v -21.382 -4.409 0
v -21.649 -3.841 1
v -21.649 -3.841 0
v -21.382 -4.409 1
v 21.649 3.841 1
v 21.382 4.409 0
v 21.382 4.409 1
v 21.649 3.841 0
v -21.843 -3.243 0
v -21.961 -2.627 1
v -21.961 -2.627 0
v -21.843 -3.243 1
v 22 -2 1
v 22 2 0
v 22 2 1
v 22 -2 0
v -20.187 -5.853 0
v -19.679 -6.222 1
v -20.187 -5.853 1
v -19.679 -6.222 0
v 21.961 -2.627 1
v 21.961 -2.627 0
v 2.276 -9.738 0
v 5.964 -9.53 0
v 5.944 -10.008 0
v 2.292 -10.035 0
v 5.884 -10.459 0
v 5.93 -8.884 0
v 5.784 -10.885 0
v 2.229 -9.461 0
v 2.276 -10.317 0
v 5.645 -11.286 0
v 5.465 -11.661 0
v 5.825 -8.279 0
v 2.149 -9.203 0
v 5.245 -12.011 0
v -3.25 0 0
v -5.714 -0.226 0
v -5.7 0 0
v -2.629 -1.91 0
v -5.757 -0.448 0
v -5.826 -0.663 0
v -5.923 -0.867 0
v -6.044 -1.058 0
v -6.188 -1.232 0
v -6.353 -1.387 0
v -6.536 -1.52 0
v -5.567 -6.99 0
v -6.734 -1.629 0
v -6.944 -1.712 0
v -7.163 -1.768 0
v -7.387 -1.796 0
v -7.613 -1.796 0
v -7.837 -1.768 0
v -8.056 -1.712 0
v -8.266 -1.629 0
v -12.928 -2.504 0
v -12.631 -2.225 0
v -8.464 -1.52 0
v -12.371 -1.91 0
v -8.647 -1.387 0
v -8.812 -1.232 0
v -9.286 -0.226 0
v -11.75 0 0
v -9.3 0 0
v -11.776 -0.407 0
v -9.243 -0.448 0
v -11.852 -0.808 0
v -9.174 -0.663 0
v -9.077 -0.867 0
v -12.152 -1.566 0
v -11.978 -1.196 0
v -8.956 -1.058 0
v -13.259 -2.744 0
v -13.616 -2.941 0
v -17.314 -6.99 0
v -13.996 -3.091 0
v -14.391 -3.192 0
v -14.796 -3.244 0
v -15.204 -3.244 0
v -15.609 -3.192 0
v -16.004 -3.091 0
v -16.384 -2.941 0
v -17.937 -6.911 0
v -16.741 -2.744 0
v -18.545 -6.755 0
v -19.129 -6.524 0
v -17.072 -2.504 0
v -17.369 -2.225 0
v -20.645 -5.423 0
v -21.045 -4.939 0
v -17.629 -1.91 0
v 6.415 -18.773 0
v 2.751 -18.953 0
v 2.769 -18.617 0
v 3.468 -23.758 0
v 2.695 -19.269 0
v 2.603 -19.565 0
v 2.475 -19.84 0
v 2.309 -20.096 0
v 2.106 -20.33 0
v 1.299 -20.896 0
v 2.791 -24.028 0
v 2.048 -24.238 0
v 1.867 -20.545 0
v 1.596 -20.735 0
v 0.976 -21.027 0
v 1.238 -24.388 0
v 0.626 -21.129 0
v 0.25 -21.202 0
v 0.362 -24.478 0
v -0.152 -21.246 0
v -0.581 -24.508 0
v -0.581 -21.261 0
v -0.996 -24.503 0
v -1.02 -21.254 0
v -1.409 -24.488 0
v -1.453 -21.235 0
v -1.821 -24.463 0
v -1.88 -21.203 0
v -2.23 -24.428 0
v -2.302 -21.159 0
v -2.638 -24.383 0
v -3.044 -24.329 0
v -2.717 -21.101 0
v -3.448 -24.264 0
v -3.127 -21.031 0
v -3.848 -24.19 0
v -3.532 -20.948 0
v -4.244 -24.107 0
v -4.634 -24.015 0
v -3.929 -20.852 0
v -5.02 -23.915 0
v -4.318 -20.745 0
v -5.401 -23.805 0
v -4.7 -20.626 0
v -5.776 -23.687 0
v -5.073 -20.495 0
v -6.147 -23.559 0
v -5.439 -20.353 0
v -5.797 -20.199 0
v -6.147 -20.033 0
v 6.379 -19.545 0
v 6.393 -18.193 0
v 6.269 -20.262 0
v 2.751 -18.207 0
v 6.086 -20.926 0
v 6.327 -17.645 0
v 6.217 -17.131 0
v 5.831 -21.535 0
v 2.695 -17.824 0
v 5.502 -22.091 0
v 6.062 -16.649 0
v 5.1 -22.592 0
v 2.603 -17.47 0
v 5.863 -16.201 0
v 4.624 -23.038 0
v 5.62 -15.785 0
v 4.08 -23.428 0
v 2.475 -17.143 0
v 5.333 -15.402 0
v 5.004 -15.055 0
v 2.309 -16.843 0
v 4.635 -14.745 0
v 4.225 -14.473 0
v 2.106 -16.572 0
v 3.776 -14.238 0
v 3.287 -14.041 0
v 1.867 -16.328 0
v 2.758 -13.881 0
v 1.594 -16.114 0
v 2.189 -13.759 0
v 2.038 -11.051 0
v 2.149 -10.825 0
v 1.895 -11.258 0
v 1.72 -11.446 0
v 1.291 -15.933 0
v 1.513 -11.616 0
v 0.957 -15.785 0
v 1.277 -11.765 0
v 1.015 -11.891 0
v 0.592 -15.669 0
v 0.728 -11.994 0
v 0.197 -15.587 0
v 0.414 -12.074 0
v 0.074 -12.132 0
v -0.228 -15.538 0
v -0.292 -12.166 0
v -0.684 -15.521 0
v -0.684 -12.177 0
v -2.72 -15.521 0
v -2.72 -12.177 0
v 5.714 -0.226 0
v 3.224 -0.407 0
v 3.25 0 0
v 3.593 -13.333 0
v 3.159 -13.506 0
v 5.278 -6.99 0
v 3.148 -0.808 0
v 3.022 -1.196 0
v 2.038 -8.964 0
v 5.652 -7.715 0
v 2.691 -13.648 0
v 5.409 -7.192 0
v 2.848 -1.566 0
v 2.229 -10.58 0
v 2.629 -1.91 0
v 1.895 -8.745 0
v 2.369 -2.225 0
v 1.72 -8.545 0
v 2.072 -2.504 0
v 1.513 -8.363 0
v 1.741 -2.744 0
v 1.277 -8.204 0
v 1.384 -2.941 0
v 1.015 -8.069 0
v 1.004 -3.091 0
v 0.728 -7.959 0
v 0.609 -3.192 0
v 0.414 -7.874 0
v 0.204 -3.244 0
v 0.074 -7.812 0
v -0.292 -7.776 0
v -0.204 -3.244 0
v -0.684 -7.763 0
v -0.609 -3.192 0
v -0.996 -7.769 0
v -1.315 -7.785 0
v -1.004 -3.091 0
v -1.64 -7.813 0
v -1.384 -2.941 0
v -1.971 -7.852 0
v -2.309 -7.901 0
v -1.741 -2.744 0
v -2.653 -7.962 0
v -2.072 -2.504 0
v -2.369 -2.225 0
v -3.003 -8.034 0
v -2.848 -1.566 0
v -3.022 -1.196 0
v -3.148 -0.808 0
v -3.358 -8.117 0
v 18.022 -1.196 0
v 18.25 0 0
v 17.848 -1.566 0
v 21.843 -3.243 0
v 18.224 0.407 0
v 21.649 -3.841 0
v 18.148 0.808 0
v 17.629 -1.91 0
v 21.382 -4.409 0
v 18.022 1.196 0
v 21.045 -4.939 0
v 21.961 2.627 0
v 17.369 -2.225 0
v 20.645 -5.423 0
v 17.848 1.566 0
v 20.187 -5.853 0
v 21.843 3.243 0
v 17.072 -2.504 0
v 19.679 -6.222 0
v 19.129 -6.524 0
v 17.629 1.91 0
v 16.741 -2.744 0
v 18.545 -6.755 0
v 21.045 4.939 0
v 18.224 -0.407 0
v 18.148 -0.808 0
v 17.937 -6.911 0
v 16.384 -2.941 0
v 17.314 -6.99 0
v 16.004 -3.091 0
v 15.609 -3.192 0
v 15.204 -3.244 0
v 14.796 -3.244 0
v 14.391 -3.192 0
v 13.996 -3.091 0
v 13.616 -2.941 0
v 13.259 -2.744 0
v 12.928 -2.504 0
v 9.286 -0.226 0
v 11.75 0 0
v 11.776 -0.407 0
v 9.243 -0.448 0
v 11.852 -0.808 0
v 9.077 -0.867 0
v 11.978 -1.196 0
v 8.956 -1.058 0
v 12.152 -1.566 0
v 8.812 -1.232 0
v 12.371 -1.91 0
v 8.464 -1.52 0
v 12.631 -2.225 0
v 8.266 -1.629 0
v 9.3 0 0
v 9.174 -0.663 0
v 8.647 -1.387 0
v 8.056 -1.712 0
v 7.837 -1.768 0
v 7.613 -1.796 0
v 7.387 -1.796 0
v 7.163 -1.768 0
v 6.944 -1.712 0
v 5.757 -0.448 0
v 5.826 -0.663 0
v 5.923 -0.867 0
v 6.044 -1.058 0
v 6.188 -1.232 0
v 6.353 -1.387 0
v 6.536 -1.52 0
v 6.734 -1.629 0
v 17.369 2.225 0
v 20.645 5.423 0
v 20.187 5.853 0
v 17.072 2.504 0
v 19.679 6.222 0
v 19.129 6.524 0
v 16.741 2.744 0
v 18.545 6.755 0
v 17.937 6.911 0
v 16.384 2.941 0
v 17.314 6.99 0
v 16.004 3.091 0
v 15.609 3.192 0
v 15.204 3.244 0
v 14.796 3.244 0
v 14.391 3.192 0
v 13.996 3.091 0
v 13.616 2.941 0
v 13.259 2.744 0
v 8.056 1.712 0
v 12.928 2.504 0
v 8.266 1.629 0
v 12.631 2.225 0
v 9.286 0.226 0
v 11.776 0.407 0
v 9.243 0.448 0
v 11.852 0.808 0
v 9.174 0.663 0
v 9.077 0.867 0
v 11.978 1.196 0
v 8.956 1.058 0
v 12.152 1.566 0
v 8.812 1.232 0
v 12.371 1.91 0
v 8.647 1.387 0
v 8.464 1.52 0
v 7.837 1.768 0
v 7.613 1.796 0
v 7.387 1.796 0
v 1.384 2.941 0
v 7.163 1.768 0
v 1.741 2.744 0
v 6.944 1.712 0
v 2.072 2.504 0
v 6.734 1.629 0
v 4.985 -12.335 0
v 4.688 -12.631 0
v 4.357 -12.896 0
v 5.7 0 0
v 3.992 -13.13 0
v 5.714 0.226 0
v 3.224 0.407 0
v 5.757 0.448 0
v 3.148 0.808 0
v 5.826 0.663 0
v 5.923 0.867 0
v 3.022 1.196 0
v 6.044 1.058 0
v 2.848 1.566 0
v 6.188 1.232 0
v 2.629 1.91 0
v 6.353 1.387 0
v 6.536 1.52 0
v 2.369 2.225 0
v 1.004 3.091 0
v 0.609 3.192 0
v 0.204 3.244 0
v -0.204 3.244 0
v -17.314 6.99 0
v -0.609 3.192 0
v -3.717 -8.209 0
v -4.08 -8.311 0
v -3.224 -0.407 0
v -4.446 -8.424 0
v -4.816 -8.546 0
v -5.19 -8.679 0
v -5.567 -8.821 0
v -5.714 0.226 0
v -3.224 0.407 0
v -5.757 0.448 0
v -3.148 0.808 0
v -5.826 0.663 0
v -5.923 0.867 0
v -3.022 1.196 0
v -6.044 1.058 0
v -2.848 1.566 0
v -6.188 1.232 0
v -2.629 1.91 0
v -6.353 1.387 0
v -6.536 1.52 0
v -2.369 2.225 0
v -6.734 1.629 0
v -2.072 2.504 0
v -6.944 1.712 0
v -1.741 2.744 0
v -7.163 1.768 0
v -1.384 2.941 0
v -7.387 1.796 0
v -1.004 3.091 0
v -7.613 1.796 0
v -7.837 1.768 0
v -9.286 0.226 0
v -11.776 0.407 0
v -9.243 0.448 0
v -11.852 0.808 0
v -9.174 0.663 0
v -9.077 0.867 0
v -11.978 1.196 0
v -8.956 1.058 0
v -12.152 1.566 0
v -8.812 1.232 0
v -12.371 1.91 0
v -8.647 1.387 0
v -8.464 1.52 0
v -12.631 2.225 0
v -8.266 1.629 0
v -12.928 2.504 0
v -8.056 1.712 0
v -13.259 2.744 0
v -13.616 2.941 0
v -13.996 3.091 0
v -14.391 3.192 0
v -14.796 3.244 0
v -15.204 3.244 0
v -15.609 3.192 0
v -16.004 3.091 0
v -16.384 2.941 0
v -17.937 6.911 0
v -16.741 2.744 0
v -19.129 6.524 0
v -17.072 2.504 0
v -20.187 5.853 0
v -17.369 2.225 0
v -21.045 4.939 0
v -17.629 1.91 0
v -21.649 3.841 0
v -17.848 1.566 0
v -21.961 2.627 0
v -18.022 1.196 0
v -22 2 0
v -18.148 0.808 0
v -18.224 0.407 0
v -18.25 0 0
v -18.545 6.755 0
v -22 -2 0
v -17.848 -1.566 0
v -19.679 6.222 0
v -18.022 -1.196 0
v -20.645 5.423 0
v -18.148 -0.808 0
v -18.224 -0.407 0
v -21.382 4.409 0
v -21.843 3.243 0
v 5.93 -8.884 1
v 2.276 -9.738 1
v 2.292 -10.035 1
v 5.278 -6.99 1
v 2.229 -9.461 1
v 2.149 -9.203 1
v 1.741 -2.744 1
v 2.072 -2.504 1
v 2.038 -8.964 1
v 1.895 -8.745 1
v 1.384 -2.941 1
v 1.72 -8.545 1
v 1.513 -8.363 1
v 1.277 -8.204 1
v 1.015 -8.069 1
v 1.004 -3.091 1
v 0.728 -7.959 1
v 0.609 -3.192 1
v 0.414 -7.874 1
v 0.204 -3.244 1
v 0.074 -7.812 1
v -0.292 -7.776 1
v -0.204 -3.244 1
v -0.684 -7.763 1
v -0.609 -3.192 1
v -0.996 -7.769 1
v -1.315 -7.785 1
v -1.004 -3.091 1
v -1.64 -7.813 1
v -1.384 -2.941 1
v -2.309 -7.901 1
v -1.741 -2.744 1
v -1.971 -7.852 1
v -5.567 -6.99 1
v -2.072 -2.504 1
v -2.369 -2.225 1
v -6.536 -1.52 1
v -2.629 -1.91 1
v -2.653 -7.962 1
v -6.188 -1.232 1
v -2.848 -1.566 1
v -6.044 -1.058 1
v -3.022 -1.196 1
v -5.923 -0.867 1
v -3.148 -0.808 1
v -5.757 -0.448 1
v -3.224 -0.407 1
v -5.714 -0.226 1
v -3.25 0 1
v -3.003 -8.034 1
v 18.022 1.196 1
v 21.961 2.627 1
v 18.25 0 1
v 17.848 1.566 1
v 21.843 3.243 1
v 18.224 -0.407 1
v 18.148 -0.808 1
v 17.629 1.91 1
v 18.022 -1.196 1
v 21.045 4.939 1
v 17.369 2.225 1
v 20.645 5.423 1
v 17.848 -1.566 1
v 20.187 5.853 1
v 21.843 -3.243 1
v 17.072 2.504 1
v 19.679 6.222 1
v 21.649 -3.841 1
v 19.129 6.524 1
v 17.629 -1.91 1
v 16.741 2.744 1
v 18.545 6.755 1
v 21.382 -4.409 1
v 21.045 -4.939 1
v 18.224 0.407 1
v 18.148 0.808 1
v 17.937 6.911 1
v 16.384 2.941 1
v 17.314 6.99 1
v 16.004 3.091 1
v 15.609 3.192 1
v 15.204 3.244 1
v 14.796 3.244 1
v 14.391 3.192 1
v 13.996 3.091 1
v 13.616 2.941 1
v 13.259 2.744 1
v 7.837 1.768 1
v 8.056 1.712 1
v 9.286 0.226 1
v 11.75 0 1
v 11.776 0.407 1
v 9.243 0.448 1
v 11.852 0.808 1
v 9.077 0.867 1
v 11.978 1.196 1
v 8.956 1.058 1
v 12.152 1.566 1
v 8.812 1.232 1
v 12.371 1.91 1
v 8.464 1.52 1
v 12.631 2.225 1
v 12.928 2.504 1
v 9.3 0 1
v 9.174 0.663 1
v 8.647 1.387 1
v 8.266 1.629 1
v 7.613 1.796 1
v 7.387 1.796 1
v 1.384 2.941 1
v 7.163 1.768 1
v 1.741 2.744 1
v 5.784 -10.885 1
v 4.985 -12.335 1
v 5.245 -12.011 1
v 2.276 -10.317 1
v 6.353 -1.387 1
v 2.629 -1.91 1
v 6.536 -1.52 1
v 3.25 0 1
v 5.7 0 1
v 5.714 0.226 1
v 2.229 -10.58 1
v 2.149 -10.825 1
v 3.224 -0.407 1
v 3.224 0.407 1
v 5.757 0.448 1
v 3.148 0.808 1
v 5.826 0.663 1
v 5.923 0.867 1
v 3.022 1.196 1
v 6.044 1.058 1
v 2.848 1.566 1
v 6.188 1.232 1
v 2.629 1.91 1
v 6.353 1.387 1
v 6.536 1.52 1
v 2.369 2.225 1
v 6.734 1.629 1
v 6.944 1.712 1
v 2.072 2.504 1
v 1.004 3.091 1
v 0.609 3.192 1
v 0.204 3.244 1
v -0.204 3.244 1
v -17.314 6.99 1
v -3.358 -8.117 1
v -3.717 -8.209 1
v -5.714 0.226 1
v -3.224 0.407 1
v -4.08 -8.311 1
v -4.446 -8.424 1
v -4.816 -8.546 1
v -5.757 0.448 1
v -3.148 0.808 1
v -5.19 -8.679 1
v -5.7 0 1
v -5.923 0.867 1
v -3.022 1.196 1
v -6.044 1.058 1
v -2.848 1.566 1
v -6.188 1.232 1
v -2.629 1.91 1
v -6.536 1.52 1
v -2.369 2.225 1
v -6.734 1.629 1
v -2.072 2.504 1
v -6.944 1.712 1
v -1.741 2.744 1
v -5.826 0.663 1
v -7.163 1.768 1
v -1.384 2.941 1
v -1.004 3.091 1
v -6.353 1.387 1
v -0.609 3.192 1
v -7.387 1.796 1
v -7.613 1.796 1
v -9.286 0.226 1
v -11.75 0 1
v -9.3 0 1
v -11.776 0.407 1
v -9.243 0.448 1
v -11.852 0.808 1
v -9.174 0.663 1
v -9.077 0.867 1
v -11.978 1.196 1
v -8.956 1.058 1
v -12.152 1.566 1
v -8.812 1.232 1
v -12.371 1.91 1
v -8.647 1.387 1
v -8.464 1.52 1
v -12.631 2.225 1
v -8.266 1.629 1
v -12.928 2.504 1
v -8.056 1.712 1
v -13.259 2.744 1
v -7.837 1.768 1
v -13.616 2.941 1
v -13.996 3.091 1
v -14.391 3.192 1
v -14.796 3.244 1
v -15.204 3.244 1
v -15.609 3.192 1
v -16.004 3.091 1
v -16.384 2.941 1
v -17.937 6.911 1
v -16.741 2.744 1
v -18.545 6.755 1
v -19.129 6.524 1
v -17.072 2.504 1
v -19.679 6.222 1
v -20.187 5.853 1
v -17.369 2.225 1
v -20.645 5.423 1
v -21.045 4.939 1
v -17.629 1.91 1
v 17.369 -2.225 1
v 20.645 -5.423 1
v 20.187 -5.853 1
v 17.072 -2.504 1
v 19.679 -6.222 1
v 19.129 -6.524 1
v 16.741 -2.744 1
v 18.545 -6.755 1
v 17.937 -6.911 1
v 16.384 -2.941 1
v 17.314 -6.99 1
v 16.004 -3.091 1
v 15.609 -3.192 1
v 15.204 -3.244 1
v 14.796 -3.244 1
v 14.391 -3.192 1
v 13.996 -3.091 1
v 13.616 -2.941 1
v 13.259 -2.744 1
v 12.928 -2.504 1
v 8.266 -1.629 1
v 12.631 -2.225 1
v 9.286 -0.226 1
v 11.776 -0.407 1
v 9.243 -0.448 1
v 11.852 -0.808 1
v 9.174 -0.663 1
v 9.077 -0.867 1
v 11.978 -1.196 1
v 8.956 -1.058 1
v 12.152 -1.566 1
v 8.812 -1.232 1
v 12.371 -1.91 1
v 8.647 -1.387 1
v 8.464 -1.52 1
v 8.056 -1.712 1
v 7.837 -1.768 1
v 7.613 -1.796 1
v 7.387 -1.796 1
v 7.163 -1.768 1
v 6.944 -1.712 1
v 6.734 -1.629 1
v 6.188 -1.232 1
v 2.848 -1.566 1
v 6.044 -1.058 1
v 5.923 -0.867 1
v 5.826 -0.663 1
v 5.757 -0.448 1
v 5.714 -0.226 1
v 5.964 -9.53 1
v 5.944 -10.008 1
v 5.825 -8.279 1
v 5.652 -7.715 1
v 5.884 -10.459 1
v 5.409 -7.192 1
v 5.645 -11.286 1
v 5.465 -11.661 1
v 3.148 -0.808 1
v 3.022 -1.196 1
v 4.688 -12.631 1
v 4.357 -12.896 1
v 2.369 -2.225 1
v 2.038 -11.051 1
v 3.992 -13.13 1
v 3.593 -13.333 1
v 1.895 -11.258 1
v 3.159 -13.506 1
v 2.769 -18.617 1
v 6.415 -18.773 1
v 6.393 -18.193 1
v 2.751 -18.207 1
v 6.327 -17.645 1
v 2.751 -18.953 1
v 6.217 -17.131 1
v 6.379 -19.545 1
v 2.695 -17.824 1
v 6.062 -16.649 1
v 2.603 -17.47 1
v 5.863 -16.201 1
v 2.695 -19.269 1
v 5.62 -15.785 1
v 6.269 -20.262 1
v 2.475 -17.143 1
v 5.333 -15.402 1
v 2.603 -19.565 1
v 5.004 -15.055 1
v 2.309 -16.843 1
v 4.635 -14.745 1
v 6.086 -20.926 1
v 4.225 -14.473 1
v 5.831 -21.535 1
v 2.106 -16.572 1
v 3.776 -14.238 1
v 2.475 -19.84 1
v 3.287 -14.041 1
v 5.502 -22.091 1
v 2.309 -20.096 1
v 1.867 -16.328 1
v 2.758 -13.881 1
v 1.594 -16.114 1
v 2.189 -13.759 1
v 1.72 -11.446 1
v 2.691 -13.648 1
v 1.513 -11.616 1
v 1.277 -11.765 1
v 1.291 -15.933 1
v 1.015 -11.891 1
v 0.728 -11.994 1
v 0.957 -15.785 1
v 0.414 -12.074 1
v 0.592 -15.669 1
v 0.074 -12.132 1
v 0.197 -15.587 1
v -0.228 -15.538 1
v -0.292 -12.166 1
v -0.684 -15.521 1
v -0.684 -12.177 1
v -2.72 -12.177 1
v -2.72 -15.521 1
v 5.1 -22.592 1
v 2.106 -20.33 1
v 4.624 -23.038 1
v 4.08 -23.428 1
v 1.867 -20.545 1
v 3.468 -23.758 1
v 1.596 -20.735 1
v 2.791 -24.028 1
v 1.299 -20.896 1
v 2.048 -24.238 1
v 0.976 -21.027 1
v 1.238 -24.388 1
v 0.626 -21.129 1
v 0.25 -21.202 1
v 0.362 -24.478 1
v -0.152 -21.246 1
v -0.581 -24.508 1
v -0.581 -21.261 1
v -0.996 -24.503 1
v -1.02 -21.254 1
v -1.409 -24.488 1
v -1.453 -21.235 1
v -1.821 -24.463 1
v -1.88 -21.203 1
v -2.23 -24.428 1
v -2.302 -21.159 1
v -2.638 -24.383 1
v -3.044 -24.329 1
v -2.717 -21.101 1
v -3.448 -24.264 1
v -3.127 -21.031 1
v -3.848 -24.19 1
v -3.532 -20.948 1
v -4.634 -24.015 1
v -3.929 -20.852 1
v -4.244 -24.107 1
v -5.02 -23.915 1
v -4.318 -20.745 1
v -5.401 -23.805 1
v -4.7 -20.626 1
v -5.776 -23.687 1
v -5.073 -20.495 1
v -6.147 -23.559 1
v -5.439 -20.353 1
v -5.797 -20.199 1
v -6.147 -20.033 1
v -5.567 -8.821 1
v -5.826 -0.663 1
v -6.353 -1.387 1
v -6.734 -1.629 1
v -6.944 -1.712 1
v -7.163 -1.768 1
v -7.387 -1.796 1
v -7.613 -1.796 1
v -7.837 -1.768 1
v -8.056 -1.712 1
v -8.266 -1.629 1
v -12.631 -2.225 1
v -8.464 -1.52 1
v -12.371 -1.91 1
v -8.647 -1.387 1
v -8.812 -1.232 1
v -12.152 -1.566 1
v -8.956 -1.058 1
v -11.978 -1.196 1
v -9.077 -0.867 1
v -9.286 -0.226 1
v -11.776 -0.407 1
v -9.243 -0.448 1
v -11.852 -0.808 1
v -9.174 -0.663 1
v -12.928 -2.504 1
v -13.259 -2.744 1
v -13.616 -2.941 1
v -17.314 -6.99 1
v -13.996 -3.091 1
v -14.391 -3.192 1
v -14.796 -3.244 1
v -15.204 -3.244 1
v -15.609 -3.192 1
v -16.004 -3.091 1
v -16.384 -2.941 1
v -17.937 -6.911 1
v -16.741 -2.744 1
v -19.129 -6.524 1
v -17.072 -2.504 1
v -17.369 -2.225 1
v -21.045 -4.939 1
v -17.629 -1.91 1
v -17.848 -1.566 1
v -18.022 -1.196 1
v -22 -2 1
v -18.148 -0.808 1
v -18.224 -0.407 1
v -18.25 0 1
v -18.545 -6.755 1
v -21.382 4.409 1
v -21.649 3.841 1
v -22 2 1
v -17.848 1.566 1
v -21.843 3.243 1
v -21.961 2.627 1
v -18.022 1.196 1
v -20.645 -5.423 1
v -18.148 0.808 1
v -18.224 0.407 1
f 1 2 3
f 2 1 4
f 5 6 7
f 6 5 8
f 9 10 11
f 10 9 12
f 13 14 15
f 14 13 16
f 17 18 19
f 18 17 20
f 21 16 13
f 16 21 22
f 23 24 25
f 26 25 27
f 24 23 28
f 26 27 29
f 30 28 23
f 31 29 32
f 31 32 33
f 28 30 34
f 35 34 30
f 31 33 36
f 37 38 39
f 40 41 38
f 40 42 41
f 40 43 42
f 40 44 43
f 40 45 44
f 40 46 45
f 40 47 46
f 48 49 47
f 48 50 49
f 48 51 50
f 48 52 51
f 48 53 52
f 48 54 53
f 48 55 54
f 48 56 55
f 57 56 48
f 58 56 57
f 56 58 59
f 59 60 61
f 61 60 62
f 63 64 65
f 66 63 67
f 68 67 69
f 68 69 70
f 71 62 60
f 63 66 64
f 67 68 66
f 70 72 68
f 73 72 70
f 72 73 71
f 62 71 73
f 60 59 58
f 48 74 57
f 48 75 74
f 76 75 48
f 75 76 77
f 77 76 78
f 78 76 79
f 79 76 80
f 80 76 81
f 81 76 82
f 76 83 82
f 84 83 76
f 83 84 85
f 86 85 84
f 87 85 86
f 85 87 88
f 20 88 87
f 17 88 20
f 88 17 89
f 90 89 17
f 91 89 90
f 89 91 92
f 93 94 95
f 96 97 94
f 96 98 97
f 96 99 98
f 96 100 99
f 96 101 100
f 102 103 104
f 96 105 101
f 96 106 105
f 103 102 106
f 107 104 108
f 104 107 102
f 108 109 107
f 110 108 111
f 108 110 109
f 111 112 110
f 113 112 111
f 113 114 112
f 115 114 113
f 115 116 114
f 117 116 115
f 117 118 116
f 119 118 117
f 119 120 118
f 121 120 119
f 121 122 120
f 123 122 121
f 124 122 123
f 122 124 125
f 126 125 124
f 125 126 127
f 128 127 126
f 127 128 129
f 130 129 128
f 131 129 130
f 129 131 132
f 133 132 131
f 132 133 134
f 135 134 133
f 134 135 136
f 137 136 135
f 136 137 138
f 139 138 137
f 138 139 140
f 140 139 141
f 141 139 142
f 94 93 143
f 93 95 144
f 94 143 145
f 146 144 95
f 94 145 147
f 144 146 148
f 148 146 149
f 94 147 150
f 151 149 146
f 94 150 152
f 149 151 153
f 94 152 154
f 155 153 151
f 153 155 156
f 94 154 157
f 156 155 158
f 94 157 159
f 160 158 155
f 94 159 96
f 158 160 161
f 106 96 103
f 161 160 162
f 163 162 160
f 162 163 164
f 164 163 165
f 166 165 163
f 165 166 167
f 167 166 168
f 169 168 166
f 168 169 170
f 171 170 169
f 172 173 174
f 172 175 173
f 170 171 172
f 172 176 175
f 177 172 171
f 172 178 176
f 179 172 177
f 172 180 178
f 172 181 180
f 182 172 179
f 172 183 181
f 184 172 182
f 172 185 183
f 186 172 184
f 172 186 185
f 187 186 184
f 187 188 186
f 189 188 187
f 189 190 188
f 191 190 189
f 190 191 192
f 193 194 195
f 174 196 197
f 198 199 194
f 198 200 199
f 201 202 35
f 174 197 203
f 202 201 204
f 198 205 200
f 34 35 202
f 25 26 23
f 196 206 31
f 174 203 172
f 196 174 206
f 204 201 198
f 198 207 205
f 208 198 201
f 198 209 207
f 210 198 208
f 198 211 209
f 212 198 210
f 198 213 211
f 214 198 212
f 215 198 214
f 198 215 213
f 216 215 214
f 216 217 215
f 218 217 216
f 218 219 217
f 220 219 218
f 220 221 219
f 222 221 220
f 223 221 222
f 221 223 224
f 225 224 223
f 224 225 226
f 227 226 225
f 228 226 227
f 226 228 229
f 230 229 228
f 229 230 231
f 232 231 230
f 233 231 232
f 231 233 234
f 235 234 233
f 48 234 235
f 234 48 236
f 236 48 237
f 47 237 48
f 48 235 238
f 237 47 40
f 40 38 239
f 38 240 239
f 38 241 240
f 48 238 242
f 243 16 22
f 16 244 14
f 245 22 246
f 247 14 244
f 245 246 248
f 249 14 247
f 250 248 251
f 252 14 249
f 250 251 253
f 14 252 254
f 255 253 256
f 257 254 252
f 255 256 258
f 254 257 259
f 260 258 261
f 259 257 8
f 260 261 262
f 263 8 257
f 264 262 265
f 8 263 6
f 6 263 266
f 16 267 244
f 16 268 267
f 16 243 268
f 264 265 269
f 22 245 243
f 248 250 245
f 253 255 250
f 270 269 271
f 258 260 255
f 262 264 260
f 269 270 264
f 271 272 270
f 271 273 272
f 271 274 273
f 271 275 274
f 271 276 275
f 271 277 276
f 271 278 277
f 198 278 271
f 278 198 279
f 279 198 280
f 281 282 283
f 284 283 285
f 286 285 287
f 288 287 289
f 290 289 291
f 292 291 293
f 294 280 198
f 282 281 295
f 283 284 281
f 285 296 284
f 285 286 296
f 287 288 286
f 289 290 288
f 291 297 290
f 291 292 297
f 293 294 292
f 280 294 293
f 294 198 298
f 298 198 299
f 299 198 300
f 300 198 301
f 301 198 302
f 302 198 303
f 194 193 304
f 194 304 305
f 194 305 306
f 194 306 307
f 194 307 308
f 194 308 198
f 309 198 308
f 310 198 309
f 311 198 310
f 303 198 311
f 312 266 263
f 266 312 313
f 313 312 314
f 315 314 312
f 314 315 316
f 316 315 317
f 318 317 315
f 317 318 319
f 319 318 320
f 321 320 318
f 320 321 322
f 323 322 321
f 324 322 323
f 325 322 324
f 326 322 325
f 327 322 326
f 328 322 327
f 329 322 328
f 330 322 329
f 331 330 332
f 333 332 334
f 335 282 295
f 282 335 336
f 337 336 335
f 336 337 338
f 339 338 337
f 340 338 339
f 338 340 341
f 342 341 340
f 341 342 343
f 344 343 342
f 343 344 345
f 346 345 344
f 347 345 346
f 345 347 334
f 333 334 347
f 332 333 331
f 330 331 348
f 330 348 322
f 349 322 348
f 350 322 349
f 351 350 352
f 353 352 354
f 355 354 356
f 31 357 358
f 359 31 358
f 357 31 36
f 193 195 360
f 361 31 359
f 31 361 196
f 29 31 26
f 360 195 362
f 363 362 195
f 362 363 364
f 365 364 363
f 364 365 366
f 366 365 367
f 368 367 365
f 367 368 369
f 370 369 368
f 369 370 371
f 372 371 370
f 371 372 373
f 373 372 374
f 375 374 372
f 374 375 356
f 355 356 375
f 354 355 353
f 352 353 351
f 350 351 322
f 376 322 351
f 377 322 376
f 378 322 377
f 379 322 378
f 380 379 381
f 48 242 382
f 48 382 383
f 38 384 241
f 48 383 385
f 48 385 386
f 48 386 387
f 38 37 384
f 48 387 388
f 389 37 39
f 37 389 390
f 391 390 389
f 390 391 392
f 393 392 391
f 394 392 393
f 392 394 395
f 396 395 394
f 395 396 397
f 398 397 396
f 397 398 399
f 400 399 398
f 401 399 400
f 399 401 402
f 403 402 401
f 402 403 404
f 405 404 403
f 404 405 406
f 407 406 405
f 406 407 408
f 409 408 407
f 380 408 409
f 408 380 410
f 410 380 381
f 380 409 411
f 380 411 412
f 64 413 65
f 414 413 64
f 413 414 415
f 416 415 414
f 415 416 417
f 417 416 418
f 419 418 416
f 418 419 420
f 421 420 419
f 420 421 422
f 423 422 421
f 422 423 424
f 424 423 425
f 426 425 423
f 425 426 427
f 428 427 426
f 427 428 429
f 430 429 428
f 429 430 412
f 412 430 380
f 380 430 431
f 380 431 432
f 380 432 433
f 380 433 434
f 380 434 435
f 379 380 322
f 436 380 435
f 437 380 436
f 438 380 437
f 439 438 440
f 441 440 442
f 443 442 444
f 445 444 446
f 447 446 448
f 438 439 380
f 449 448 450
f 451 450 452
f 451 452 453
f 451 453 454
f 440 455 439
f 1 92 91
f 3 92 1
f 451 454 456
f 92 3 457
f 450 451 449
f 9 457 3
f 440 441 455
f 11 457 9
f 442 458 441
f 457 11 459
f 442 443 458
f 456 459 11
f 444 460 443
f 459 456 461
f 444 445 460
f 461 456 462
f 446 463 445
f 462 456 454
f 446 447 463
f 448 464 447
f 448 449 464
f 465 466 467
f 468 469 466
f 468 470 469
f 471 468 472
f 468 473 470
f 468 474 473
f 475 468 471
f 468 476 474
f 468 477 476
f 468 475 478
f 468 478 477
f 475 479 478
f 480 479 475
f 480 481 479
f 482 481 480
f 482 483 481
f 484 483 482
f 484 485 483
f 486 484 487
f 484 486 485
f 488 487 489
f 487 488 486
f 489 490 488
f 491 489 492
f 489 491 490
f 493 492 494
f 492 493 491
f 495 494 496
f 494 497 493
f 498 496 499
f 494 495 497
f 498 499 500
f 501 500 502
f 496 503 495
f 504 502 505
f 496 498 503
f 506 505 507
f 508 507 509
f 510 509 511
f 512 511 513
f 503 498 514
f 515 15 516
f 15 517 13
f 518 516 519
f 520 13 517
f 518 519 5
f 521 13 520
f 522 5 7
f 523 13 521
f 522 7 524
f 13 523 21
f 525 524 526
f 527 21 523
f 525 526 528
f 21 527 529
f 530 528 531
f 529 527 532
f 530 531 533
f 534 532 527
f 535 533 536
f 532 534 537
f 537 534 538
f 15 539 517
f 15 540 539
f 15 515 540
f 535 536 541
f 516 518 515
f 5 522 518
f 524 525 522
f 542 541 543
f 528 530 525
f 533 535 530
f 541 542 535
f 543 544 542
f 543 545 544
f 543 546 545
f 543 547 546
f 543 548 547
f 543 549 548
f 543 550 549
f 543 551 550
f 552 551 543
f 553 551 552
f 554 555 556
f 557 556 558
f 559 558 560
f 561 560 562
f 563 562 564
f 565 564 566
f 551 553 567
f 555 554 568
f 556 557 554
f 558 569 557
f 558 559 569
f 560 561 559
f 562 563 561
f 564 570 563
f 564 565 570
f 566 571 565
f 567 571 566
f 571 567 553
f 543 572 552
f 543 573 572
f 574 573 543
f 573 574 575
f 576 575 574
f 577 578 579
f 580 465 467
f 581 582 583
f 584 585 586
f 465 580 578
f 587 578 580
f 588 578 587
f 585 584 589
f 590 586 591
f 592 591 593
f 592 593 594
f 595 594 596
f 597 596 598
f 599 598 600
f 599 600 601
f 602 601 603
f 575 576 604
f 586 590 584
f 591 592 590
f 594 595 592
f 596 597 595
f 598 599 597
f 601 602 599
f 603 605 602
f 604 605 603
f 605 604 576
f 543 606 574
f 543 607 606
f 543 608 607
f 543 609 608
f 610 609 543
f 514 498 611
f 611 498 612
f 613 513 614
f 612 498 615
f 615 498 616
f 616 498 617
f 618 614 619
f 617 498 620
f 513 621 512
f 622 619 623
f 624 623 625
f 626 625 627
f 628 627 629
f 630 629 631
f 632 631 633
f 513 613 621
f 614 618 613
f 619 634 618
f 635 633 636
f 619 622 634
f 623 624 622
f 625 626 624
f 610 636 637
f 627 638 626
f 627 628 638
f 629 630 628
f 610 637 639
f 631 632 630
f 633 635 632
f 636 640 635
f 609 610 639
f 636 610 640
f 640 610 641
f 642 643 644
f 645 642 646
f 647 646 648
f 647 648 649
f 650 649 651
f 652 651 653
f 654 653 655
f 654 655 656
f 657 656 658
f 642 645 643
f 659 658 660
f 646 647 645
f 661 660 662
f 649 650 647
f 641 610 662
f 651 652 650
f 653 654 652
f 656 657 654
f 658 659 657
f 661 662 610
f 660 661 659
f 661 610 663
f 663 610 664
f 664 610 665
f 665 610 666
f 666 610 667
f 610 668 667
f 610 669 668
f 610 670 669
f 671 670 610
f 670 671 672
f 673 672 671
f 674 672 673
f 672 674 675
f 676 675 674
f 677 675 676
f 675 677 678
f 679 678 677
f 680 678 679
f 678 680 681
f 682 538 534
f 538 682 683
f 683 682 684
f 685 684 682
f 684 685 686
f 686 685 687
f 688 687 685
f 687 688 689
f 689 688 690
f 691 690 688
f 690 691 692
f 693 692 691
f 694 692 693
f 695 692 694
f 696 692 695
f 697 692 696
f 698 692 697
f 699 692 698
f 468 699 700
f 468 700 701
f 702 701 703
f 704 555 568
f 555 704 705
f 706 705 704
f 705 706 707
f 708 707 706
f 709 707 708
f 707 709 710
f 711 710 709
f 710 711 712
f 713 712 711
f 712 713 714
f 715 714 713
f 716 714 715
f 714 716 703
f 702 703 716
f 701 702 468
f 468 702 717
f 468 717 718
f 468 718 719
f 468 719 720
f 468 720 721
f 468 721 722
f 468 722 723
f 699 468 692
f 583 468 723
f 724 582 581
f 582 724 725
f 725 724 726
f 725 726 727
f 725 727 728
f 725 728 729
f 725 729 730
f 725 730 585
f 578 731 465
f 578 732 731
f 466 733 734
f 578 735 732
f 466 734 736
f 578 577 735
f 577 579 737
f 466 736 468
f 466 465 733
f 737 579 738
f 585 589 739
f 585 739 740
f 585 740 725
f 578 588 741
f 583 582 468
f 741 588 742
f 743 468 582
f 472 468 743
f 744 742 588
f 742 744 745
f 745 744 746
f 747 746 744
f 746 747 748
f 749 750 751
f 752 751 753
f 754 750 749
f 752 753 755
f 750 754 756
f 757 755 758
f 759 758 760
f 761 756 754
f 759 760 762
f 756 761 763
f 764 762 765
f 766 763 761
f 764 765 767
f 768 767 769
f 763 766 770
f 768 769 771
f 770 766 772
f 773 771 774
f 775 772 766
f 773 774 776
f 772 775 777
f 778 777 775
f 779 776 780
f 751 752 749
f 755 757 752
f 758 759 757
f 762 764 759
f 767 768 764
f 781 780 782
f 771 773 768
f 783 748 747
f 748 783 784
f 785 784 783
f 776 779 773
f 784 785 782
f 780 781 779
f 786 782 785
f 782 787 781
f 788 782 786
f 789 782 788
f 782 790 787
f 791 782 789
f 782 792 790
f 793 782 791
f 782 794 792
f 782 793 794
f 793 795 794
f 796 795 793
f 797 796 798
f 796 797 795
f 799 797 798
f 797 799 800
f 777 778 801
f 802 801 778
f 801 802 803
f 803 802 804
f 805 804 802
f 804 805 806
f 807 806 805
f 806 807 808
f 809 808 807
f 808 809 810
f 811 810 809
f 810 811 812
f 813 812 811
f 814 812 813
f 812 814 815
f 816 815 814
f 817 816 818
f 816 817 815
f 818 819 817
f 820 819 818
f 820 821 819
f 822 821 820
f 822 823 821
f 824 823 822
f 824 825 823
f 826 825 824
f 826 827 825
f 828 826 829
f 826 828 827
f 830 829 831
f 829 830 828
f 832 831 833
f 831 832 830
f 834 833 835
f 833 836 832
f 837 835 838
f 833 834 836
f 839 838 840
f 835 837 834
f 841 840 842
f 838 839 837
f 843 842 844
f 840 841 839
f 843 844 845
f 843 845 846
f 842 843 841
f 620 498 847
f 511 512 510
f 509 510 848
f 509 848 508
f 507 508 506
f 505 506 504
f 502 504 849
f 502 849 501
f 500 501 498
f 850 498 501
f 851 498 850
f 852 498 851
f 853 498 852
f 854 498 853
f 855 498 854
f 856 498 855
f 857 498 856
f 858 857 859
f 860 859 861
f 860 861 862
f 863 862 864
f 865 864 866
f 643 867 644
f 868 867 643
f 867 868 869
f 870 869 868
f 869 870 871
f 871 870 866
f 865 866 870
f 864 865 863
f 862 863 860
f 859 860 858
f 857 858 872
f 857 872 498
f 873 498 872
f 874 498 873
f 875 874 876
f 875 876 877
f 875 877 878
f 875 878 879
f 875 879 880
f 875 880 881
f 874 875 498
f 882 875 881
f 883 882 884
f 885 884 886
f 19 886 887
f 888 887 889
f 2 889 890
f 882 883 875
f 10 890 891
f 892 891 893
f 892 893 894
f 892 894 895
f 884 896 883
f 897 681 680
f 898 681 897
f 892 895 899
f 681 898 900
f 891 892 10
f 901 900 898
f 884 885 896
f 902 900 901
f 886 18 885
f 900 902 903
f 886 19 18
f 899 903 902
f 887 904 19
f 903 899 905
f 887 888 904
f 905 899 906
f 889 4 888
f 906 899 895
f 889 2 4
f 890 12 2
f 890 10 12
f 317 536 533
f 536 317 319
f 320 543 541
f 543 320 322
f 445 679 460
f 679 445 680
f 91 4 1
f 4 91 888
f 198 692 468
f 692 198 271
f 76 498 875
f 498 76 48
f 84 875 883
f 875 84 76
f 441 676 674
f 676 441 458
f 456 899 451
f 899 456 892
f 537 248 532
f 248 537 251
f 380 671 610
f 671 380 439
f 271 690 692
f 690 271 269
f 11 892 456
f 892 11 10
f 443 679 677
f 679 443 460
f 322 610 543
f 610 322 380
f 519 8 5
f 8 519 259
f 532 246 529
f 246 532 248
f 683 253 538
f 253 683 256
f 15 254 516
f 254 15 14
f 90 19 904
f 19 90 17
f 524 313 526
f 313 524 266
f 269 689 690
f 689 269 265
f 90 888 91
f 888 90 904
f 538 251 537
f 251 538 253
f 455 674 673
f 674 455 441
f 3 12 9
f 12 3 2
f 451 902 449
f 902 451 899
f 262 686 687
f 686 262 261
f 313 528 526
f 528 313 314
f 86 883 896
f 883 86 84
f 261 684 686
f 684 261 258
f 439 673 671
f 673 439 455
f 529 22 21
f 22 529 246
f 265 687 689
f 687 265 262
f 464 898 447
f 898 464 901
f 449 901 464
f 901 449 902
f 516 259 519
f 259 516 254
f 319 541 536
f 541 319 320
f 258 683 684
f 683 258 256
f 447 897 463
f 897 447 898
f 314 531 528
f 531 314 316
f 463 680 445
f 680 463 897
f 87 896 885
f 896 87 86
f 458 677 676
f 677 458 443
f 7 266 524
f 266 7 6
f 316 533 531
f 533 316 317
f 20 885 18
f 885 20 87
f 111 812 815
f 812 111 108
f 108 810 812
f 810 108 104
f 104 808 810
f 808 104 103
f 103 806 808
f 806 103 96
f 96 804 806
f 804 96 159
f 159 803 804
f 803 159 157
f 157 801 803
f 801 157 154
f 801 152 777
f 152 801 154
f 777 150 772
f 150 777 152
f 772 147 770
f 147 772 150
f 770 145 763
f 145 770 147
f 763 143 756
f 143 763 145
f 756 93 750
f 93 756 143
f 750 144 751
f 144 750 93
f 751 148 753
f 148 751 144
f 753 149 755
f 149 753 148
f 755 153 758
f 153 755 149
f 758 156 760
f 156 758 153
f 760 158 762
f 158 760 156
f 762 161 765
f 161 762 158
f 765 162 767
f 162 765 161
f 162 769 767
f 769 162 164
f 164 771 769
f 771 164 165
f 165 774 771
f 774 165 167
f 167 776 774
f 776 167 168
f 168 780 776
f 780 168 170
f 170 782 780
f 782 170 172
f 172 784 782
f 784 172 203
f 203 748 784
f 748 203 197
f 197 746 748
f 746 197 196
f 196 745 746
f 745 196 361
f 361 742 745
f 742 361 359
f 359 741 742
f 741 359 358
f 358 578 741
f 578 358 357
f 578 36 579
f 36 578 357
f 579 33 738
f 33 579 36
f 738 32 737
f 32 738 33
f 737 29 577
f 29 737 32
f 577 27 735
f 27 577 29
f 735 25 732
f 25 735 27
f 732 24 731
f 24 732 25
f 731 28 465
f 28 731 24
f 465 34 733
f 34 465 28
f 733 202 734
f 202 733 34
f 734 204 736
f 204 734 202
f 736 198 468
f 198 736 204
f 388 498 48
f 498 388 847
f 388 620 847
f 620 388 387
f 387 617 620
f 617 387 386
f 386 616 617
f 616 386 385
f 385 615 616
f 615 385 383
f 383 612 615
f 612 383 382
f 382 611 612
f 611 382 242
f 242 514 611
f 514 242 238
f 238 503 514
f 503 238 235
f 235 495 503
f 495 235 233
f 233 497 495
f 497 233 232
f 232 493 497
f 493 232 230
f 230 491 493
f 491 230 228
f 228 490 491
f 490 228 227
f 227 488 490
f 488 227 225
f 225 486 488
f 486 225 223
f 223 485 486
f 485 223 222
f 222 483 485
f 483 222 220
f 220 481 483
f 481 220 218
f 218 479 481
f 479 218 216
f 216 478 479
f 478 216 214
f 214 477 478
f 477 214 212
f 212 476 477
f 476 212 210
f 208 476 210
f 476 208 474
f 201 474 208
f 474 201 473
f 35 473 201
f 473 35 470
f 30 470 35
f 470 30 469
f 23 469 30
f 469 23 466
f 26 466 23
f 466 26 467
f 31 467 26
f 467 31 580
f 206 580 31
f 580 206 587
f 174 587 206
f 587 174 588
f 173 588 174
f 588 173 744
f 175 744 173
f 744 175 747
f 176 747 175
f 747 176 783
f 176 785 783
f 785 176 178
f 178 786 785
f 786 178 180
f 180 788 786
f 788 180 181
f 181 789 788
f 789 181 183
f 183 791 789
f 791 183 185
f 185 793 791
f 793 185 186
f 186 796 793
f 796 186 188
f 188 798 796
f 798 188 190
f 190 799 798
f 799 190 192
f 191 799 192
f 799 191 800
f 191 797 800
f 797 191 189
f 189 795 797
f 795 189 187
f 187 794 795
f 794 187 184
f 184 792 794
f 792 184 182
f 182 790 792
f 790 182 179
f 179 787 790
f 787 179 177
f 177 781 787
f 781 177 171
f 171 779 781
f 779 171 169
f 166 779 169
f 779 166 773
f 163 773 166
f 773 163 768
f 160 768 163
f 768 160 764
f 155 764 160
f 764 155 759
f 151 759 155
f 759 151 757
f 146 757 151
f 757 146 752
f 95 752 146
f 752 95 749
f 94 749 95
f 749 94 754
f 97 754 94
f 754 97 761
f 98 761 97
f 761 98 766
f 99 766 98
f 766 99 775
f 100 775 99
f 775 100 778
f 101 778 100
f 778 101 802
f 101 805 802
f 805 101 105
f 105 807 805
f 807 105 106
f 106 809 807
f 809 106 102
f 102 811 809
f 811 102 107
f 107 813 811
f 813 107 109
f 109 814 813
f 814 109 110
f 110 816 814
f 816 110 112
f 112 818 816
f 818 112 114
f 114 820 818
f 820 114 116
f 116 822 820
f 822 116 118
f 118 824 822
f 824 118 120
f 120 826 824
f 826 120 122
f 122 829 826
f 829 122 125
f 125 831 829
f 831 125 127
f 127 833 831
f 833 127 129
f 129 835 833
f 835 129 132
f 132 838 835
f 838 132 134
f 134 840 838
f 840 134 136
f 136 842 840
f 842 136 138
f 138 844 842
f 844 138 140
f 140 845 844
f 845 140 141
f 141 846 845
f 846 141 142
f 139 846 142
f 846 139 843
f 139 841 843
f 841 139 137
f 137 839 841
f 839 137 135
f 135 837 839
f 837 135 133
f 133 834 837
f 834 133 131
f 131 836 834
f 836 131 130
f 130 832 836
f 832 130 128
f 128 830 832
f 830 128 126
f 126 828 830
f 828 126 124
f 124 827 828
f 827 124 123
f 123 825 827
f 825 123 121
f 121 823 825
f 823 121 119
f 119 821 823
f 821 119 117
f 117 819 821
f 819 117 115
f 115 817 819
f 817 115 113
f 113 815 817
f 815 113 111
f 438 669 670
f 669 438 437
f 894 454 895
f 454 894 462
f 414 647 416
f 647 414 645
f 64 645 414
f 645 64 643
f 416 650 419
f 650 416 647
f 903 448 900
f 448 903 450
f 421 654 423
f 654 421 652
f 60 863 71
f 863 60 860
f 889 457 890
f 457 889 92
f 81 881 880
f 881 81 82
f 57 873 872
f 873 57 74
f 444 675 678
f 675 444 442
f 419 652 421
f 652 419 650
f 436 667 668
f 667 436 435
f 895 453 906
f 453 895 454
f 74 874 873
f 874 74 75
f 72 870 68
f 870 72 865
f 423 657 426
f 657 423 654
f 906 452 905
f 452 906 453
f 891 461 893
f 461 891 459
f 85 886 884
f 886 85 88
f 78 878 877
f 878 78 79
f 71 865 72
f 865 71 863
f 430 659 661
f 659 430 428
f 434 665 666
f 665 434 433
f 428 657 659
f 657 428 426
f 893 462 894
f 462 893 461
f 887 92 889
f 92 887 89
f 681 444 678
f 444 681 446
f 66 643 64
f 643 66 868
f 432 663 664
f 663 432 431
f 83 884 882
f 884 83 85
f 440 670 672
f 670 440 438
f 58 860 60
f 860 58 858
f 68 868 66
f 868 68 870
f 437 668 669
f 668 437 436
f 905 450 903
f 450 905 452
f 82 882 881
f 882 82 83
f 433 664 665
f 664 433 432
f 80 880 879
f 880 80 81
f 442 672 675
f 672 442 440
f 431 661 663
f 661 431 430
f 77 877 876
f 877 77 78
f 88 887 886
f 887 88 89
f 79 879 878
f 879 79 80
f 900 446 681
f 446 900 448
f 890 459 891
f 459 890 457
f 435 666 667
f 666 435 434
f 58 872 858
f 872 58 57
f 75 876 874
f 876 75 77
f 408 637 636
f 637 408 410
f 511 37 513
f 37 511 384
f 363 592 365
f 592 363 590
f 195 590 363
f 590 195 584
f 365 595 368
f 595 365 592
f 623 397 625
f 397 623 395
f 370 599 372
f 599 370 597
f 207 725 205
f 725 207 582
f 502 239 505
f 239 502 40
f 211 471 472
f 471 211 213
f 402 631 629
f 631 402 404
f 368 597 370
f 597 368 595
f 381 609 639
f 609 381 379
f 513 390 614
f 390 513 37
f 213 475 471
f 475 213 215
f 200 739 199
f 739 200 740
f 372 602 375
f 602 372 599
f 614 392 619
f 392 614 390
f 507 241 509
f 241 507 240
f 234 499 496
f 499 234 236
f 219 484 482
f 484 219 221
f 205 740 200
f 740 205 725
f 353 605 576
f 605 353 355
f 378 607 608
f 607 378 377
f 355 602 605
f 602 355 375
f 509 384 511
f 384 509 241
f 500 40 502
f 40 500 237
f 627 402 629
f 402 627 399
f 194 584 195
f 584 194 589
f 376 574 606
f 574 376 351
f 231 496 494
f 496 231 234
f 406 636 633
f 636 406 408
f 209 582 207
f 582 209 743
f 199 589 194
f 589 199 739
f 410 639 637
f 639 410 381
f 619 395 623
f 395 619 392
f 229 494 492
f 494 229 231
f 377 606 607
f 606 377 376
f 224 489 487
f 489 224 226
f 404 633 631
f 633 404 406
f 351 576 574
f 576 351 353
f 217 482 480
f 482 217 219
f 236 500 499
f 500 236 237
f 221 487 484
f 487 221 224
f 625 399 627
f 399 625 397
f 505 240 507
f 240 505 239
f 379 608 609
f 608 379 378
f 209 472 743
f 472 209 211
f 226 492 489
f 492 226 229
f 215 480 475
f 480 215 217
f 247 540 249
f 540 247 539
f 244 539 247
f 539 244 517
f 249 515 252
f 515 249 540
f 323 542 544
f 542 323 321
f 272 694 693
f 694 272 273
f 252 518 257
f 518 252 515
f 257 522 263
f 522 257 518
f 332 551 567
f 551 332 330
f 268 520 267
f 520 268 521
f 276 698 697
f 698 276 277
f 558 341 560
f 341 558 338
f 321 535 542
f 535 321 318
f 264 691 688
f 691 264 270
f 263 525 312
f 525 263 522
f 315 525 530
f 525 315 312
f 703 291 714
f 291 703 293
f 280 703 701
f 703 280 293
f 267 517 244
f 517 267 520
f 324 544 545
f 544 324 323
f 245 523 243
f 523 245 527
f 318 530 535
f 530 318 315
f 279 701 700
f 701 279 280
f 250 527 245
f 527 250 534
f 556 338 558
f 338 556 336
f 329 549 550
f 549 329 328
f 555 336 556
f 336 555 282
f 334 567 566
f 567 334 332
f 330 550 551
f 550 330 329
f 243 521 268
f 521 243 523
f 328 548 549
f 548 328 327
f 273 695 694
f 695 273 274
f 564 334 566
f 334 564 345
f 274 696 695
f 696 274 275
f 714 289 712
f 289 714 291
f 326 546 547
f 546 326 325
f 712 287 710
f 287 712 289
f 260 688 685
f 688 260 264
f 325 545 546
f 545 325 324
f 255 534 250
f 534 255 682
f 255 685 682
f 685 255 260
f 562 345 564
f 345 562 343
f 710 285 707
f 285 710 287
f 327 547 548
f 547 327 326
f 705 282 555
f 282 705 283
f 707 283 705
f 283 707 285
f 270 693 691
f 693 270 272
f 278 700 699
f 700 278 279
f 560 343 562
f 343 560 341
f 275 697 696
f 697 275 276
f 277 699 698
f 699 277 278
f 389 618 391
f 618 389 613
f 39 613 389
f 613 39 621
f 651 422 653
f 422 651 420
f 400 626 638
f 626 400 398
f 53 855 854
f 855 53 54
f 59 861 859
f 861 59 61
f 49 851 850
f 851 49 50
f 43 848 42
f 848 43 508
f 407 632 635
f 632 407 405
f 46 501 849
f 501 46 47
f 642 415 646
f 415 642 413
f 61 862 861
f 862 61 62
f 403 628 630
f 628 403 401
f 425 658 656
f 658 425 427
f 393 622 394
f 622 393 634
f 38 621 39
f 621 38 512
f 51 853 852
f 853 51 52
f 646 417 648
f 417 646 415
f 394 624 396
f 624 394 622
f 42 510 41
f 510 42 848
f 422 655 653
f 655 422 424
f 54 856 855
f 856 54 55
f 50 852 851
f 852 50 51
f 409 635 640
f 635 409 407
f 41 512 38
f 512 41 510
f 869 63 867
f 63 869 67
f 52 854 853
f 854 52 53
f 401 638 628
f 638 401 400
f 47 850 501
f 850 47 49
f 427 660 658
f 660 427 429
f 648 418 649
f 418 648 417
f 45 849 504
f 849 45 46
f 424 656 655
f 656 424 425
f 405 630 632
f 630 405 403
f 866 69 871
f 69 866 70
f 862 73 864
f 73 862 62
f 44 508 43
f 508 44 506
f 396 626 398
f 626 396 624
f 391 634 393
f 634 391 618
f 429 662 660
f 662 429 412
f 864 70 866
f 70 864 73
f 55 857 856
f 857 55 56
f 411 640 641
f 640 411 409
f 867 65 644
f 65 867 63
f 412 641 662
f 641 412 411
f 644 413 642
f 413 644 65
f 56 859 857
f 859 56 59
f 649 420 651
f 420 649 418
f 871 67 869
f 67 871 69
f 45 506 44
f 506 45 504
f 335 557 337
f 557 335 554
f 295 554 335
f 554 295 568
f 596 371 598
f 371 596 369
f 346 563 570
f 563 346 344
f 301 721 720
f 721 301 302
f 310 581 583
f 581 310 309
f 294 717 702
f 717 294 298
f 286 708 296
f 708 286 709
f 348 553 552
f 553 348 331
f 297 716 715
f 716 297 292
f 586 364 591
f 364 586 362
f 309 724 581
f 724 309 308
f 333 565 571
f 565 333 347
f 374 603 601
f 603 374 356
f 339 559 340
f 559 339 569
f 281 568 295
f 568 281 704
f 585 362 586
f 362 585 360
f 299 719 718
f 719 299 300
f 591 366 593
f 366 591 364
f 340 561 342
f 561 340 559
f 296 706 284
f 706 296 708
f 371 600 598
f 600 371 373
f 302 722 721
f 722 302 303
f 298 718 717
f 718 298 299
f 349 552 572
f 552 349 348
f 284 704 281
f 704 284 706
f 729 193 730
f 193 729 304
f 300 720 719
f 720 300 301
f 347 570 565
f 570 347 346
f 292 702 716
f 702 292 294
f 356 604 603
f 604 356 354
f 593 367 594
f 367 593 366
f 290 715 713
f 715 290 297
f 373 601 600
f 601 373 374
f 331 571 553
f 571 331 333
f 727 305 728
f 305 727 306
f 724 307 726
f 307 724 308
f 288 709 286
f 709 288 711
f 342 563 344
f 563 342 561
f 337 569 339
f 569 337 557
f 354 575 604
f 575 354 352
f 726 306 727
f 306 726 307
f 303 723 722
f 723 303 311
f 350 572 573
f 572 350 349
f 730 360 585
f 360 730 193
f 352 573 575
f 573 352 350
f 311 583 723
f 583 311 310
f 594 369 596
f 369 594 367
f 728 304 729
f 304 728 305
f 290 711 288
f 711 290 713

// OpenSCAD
$fn = 50;


difference() {
	union() {
		hull() {
			translate(v = [-17.0000000000, 2.0000000000, 0]) {
				cylinder(h = 1, r = 5);
			}
			translate(v = [17.0000000000, 2.0000000000, 0]) {
				cylinder(h = 1, r = 5);
			}
			translate(v = [-17.0000000000, -2.0000000000, 0]) {
				cylinder(h = 1, r = 5);
			}
			translate(v = [17.0000000000, -2.0000000000, 0]) {
				cylinder(h = 1, r = 5);
			}
		}
		translate(v = [0, -5, 0]) {
			linear_extrude(height = 1) {
				text(font = "DejaVu Sans Mono:style=Bold", halign = "center", size = 19.0000000000, text = "3", valign = "top");
			}
		}
	}
	union() {
		translate(v = [-15.0000000000, 0.0000000000, 0]) {
			translate(v = [0, 0, -100]) {
				cylinder(h = 200, r = 3.2500000000);
			}
		}
		translate(v = [0, 0, -100]) {
			cylinder(h = 200, r = 3.2500000000);
		}
		translate(v = [15.0000000000, 0.0000000000, 0]) {
			translate(v = [0, 0, -100]) {
				cylinder(h = 200, r = 3.2500000000);
			}
		}
		translate(v = [-15.0000000000, 0.0000000000, 0]) {
			translate(v = [0, 0, -100]) {
				cylinder(h = 200, r = 1.8000000000);
			}
		}
		translate(v = [-7.5000000000, 0.0000000000, 0]) {
			translate(v = [0, 0, -100]) {
				cylinder(h = 200, r = 1.8000000000);
			}
		}
		translate(v = [0, 0, -100]) {
			cylinder(h = 200, r = 1.8000000000);
		}
		translate(v = [7.5000000000, 0.0000000000, 0]) {
			translate(v = [0, 0, -100]) {
				cylinder(h = 200, r = 1.8000000000);
			}
		}
		translate(v = [15.0000000000, 0.0000000000, 0]) {
			translate(v = [0, 0, -100]) {
				cylinder(h = 200, r = 1.8000000000);
			}
		}
	}
}
